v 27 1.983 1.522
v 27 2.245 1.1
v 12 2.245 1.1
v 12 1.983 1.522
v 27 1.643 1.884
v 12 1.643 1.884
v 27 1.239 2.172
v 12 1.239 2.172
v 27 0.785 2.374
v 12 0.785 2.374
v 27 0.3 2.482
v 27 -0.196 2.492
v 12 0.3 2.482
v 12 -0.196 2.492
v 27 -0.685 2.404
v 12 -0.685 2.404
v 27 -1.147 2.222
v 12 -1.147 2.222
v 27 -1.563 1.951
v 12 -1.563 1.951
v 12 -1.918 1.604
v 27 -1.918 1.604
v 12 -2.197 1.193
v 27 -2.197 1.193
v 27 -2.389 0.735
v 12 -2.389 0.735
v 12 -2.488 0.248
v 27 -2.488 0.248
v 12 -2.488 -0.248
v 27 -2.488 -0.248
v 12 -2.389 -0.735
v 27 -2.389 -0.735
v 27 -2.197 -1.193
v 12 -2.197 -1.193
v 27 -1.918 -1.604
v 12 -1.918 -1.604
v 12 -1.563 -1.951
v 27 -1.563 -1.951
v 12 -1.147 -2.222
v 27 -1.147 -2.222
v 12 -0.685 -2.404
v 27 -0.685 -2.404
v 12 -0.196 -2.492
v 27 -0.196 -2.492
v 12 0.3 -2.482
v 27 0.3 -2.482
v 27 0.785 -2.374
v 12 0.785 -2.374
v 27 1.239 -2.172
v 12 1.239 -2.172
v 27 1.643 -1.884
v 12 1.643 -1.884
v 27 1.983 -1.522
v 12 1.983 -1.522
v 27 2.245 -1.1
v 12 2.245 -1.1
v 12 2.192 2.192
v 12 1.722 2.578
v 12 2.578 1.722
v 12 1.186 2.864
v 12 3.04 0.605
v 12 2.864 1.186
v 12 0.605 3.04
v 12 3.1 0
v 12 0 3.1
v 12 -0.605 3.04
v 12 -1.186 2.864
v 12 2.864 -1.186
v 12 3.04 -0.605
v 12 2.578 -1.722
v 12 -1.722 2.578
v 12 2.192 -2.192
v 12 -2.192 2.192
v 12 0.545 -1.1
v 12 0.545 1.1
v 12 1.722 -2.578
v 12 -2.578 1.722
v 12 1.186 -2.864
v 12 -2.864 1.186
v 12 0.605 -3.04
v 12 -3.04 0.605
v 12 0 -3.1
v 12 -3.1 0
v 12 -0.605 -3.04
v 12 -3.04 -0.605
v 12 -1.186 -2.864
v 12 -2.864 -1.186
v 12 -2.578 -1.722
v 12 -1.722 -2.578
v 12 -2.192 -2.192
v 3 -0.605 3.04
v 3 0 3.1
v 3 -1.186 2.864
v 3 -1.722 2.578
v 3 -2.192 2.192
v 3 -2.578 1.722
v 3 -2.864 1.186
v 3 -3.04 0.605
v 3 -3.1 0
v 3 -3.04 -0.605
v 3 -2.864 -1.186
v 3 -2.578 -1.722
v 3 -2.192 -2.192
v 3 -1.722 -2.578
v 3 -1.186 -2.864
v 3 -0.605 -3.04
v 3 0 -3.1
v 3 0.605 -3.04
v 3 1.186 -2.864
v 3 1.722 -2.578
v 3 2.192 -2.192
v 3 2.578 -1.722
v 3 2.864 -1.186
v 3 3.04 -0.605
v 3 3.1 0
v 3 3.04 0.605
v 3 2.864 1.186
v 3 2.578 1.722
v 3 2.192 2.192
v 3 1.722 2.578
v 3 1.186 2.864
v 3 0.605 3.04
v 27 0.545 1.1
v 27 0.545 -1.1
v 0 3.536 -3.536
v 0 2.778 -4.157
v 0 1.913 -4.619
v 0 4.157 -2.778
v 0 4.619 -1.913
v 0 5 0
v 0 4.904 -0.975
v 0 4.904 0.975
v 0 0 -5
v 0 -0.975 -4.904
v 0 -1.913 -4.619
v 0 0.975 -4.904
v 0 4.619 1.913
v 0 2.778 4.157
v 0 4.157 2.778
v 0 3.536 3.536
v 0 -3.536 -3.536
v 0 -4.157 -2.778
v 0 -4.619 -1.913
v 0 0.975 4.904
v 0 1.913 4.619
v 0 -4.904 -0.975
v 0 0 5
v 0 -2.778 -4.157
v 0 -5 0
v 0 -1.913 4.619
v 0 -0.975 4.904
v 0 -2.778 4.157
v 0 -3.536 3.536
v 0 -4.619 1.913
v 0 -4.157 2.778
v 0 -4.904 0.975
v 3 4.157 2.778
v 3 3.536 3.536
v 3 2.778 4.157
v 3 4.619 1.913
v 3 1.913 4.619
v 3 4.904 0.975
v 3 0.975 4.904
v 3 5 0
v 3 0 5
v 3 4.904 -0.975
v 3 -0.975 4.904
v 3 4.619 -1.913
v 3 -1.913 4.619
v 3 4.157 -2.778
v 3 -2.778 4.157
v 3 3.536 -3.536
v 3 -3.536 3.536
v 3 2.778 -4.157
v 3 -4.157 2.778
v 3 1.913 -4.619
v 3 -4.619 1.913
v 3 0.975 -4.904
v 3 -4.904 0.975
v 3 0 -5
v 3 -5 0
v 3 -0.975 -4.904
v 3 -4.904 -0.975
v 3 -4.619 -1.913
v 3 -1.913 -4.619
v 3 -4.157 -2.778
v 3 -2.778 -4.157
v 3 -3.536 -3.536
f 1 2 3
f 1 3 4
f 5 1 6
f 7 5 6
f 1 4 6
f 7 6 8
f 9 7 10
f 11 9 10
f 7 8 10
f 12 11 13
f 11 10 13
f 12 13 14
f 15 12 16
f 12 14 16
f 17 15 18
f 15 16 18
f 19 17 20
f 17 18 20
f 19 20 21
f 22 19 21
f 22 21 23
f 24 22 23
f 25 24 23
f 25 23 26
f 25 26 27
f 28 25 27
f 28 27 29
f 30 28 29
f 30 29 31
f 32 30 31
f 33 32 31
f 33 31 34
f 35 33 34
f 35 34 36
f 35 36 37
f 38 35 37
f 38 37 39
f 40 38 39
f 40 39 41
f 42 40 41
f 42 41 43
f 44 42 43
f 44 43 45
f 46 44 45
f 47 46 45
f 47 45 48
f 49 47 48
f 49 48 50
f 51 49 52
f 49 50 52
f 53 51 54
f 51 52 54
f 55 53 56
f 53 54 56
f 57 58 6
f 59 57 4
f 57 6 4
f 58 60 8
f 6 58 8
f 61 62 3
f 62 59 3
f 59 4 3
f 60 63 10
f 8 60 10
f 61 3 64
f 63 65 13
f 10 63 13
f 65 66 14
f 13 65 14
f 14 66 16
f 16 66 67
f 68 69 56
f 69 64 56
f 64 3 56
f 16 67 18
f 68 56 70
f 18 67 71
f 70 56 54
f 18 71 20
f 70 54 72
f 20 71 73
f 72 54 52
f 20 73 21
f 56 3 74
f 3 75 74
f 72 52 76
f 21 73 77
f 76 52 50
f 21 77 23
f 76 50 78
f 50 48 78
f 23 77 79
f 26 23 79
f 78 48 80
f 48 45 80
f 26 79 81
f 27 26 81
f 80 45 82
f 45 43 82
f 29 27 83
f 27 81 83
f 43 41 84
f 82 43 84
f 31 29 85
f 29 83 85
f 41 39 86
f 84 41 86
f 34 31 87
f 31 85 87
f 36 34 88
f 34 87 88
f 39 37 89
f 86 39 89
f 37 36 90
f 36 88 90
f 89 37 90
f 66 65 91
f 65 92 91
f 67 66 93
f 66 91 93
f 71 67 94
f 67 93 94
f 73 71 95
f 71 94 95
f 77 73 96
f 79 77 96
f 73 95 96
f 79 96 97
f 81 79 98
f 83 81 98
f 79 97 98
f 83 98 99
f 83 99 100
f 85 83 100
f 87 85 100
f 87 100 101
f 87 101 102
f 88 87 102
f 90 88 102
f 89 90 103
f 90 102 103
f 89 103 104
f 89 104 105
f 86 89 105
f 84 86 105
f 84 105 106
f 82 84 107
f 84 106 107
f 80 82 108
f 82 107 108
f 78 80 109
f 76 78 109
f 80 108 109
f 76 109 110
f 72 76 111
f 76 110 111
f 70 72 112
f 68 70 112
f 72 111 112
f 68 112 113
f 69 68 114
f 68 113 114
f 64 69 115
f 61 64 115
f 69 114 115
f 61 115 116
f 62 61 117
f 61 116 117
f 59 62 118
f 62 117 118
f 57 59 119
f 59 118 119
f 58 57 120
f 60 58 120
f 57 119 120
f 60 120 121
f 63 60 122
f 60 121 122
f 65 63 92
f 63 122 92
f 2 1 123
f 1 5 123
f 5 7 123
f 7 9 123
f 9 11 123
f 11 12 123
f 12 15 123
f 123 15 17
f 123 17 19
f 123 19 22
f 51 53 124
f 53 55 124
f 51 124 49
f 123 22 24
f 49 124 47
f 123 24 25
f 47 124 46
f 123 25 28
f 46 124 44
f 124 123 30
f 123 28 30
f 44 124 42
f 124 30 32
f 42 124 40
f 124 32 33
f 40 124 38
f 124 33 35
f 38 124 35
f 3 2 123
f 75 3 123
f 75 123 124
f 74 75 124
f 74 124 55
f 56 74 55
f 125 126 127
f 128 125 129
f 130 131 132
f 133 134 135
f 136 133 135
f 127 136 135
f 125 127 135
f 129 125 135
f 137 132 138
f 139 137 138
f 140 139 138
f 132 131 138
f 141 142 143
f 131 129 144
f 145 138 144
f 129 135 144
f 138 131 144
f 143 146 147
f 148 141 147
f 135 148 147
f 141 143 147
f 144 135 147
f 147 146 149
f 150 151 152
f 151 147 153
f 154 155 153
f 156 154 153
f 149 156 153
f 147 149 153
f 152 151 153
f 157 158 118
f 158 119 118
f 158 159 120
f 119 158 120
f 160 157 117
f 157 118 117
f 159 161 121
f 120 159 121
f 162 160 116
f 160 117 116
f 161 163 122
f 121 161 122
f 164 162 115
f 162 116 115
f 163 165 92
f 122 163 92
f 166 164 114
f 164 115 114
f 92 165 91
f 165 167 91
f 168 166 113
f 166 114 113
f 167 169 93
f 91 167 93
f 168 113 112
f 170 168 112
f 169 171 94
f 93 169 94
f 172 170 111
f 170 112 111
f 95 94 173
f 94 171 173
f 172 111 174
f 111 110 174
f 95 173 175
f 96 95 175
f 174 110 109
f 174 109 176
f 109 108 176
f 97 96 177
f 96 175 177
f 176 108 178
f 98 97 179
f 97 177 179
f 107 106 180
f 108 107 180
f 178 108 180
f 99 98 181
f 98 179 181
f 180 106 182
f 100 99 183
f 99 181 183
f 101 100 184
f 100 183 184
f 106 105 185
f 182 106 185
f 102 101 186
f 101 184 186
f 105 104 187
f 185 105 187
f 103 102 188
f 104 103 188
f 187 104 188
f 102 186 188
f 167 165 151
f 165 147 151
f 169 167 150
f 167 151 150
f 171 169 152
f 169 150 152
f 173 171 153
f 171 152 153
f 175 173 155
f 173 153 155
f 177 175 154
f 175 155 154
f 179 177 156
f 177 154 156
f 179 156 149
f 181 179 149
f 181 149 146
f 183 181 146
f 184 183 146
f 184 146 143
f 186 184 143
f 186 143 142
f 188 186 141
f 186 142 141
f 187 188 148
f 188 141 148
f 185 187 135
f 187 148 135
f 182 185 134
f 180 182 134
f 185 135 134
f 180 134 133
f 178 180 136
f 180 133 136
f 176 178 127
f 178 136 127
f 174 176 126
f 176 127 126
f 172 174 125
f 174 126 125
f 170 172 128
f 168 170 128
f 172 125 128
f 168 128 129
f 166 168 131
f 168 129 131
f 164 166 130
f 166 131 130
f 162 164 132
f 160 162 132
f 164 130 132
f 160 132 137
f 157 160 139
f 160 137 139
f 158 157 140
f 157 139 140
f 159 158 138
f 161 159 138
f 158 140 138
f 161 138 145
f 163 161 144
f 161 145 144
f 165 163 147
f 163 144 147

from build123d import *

# Parameters (mm, degrees)
CUT_EXTRUDE1_DEPTH = 15


with BuildPart() as part:
    # Sketch1 → Revolve1 (revolve)
    with BuildSketch(Plane.XY, mode=Mode.PRIVATE) as revolve1_sk:
        Polygon((0, 0), (27, 0), (27, 2.5), (12, 2.5), (12, 3.1), (3, 3.1), (3, 5), (0, 5), align=None)
    revolve(revolve1_sk.sketch.rotate(Axis((0, 0, 0), (1, 0, 0)), 90), axis=Axis((0, 0, 0), (1, 0, 0)))

    # Sketch2 → Cut-Extrude1 (cut)
    with BuildSketch(Plane(origin=(27, 0, 0), x_dir=(0, 0, -1), z_dir=(1, 0, 0))):
        Polygon((-1.1, 2.244994432), (-1.1, 0.544994432), (1.1, 0.544994432), (1.1, 2.244994432), (0, 3.059798295), align=None)
    extrude(amount=-CUT_EXTRUDE1_DEPTH, mode=Mode.SUBTRACT)


solid = part.part
